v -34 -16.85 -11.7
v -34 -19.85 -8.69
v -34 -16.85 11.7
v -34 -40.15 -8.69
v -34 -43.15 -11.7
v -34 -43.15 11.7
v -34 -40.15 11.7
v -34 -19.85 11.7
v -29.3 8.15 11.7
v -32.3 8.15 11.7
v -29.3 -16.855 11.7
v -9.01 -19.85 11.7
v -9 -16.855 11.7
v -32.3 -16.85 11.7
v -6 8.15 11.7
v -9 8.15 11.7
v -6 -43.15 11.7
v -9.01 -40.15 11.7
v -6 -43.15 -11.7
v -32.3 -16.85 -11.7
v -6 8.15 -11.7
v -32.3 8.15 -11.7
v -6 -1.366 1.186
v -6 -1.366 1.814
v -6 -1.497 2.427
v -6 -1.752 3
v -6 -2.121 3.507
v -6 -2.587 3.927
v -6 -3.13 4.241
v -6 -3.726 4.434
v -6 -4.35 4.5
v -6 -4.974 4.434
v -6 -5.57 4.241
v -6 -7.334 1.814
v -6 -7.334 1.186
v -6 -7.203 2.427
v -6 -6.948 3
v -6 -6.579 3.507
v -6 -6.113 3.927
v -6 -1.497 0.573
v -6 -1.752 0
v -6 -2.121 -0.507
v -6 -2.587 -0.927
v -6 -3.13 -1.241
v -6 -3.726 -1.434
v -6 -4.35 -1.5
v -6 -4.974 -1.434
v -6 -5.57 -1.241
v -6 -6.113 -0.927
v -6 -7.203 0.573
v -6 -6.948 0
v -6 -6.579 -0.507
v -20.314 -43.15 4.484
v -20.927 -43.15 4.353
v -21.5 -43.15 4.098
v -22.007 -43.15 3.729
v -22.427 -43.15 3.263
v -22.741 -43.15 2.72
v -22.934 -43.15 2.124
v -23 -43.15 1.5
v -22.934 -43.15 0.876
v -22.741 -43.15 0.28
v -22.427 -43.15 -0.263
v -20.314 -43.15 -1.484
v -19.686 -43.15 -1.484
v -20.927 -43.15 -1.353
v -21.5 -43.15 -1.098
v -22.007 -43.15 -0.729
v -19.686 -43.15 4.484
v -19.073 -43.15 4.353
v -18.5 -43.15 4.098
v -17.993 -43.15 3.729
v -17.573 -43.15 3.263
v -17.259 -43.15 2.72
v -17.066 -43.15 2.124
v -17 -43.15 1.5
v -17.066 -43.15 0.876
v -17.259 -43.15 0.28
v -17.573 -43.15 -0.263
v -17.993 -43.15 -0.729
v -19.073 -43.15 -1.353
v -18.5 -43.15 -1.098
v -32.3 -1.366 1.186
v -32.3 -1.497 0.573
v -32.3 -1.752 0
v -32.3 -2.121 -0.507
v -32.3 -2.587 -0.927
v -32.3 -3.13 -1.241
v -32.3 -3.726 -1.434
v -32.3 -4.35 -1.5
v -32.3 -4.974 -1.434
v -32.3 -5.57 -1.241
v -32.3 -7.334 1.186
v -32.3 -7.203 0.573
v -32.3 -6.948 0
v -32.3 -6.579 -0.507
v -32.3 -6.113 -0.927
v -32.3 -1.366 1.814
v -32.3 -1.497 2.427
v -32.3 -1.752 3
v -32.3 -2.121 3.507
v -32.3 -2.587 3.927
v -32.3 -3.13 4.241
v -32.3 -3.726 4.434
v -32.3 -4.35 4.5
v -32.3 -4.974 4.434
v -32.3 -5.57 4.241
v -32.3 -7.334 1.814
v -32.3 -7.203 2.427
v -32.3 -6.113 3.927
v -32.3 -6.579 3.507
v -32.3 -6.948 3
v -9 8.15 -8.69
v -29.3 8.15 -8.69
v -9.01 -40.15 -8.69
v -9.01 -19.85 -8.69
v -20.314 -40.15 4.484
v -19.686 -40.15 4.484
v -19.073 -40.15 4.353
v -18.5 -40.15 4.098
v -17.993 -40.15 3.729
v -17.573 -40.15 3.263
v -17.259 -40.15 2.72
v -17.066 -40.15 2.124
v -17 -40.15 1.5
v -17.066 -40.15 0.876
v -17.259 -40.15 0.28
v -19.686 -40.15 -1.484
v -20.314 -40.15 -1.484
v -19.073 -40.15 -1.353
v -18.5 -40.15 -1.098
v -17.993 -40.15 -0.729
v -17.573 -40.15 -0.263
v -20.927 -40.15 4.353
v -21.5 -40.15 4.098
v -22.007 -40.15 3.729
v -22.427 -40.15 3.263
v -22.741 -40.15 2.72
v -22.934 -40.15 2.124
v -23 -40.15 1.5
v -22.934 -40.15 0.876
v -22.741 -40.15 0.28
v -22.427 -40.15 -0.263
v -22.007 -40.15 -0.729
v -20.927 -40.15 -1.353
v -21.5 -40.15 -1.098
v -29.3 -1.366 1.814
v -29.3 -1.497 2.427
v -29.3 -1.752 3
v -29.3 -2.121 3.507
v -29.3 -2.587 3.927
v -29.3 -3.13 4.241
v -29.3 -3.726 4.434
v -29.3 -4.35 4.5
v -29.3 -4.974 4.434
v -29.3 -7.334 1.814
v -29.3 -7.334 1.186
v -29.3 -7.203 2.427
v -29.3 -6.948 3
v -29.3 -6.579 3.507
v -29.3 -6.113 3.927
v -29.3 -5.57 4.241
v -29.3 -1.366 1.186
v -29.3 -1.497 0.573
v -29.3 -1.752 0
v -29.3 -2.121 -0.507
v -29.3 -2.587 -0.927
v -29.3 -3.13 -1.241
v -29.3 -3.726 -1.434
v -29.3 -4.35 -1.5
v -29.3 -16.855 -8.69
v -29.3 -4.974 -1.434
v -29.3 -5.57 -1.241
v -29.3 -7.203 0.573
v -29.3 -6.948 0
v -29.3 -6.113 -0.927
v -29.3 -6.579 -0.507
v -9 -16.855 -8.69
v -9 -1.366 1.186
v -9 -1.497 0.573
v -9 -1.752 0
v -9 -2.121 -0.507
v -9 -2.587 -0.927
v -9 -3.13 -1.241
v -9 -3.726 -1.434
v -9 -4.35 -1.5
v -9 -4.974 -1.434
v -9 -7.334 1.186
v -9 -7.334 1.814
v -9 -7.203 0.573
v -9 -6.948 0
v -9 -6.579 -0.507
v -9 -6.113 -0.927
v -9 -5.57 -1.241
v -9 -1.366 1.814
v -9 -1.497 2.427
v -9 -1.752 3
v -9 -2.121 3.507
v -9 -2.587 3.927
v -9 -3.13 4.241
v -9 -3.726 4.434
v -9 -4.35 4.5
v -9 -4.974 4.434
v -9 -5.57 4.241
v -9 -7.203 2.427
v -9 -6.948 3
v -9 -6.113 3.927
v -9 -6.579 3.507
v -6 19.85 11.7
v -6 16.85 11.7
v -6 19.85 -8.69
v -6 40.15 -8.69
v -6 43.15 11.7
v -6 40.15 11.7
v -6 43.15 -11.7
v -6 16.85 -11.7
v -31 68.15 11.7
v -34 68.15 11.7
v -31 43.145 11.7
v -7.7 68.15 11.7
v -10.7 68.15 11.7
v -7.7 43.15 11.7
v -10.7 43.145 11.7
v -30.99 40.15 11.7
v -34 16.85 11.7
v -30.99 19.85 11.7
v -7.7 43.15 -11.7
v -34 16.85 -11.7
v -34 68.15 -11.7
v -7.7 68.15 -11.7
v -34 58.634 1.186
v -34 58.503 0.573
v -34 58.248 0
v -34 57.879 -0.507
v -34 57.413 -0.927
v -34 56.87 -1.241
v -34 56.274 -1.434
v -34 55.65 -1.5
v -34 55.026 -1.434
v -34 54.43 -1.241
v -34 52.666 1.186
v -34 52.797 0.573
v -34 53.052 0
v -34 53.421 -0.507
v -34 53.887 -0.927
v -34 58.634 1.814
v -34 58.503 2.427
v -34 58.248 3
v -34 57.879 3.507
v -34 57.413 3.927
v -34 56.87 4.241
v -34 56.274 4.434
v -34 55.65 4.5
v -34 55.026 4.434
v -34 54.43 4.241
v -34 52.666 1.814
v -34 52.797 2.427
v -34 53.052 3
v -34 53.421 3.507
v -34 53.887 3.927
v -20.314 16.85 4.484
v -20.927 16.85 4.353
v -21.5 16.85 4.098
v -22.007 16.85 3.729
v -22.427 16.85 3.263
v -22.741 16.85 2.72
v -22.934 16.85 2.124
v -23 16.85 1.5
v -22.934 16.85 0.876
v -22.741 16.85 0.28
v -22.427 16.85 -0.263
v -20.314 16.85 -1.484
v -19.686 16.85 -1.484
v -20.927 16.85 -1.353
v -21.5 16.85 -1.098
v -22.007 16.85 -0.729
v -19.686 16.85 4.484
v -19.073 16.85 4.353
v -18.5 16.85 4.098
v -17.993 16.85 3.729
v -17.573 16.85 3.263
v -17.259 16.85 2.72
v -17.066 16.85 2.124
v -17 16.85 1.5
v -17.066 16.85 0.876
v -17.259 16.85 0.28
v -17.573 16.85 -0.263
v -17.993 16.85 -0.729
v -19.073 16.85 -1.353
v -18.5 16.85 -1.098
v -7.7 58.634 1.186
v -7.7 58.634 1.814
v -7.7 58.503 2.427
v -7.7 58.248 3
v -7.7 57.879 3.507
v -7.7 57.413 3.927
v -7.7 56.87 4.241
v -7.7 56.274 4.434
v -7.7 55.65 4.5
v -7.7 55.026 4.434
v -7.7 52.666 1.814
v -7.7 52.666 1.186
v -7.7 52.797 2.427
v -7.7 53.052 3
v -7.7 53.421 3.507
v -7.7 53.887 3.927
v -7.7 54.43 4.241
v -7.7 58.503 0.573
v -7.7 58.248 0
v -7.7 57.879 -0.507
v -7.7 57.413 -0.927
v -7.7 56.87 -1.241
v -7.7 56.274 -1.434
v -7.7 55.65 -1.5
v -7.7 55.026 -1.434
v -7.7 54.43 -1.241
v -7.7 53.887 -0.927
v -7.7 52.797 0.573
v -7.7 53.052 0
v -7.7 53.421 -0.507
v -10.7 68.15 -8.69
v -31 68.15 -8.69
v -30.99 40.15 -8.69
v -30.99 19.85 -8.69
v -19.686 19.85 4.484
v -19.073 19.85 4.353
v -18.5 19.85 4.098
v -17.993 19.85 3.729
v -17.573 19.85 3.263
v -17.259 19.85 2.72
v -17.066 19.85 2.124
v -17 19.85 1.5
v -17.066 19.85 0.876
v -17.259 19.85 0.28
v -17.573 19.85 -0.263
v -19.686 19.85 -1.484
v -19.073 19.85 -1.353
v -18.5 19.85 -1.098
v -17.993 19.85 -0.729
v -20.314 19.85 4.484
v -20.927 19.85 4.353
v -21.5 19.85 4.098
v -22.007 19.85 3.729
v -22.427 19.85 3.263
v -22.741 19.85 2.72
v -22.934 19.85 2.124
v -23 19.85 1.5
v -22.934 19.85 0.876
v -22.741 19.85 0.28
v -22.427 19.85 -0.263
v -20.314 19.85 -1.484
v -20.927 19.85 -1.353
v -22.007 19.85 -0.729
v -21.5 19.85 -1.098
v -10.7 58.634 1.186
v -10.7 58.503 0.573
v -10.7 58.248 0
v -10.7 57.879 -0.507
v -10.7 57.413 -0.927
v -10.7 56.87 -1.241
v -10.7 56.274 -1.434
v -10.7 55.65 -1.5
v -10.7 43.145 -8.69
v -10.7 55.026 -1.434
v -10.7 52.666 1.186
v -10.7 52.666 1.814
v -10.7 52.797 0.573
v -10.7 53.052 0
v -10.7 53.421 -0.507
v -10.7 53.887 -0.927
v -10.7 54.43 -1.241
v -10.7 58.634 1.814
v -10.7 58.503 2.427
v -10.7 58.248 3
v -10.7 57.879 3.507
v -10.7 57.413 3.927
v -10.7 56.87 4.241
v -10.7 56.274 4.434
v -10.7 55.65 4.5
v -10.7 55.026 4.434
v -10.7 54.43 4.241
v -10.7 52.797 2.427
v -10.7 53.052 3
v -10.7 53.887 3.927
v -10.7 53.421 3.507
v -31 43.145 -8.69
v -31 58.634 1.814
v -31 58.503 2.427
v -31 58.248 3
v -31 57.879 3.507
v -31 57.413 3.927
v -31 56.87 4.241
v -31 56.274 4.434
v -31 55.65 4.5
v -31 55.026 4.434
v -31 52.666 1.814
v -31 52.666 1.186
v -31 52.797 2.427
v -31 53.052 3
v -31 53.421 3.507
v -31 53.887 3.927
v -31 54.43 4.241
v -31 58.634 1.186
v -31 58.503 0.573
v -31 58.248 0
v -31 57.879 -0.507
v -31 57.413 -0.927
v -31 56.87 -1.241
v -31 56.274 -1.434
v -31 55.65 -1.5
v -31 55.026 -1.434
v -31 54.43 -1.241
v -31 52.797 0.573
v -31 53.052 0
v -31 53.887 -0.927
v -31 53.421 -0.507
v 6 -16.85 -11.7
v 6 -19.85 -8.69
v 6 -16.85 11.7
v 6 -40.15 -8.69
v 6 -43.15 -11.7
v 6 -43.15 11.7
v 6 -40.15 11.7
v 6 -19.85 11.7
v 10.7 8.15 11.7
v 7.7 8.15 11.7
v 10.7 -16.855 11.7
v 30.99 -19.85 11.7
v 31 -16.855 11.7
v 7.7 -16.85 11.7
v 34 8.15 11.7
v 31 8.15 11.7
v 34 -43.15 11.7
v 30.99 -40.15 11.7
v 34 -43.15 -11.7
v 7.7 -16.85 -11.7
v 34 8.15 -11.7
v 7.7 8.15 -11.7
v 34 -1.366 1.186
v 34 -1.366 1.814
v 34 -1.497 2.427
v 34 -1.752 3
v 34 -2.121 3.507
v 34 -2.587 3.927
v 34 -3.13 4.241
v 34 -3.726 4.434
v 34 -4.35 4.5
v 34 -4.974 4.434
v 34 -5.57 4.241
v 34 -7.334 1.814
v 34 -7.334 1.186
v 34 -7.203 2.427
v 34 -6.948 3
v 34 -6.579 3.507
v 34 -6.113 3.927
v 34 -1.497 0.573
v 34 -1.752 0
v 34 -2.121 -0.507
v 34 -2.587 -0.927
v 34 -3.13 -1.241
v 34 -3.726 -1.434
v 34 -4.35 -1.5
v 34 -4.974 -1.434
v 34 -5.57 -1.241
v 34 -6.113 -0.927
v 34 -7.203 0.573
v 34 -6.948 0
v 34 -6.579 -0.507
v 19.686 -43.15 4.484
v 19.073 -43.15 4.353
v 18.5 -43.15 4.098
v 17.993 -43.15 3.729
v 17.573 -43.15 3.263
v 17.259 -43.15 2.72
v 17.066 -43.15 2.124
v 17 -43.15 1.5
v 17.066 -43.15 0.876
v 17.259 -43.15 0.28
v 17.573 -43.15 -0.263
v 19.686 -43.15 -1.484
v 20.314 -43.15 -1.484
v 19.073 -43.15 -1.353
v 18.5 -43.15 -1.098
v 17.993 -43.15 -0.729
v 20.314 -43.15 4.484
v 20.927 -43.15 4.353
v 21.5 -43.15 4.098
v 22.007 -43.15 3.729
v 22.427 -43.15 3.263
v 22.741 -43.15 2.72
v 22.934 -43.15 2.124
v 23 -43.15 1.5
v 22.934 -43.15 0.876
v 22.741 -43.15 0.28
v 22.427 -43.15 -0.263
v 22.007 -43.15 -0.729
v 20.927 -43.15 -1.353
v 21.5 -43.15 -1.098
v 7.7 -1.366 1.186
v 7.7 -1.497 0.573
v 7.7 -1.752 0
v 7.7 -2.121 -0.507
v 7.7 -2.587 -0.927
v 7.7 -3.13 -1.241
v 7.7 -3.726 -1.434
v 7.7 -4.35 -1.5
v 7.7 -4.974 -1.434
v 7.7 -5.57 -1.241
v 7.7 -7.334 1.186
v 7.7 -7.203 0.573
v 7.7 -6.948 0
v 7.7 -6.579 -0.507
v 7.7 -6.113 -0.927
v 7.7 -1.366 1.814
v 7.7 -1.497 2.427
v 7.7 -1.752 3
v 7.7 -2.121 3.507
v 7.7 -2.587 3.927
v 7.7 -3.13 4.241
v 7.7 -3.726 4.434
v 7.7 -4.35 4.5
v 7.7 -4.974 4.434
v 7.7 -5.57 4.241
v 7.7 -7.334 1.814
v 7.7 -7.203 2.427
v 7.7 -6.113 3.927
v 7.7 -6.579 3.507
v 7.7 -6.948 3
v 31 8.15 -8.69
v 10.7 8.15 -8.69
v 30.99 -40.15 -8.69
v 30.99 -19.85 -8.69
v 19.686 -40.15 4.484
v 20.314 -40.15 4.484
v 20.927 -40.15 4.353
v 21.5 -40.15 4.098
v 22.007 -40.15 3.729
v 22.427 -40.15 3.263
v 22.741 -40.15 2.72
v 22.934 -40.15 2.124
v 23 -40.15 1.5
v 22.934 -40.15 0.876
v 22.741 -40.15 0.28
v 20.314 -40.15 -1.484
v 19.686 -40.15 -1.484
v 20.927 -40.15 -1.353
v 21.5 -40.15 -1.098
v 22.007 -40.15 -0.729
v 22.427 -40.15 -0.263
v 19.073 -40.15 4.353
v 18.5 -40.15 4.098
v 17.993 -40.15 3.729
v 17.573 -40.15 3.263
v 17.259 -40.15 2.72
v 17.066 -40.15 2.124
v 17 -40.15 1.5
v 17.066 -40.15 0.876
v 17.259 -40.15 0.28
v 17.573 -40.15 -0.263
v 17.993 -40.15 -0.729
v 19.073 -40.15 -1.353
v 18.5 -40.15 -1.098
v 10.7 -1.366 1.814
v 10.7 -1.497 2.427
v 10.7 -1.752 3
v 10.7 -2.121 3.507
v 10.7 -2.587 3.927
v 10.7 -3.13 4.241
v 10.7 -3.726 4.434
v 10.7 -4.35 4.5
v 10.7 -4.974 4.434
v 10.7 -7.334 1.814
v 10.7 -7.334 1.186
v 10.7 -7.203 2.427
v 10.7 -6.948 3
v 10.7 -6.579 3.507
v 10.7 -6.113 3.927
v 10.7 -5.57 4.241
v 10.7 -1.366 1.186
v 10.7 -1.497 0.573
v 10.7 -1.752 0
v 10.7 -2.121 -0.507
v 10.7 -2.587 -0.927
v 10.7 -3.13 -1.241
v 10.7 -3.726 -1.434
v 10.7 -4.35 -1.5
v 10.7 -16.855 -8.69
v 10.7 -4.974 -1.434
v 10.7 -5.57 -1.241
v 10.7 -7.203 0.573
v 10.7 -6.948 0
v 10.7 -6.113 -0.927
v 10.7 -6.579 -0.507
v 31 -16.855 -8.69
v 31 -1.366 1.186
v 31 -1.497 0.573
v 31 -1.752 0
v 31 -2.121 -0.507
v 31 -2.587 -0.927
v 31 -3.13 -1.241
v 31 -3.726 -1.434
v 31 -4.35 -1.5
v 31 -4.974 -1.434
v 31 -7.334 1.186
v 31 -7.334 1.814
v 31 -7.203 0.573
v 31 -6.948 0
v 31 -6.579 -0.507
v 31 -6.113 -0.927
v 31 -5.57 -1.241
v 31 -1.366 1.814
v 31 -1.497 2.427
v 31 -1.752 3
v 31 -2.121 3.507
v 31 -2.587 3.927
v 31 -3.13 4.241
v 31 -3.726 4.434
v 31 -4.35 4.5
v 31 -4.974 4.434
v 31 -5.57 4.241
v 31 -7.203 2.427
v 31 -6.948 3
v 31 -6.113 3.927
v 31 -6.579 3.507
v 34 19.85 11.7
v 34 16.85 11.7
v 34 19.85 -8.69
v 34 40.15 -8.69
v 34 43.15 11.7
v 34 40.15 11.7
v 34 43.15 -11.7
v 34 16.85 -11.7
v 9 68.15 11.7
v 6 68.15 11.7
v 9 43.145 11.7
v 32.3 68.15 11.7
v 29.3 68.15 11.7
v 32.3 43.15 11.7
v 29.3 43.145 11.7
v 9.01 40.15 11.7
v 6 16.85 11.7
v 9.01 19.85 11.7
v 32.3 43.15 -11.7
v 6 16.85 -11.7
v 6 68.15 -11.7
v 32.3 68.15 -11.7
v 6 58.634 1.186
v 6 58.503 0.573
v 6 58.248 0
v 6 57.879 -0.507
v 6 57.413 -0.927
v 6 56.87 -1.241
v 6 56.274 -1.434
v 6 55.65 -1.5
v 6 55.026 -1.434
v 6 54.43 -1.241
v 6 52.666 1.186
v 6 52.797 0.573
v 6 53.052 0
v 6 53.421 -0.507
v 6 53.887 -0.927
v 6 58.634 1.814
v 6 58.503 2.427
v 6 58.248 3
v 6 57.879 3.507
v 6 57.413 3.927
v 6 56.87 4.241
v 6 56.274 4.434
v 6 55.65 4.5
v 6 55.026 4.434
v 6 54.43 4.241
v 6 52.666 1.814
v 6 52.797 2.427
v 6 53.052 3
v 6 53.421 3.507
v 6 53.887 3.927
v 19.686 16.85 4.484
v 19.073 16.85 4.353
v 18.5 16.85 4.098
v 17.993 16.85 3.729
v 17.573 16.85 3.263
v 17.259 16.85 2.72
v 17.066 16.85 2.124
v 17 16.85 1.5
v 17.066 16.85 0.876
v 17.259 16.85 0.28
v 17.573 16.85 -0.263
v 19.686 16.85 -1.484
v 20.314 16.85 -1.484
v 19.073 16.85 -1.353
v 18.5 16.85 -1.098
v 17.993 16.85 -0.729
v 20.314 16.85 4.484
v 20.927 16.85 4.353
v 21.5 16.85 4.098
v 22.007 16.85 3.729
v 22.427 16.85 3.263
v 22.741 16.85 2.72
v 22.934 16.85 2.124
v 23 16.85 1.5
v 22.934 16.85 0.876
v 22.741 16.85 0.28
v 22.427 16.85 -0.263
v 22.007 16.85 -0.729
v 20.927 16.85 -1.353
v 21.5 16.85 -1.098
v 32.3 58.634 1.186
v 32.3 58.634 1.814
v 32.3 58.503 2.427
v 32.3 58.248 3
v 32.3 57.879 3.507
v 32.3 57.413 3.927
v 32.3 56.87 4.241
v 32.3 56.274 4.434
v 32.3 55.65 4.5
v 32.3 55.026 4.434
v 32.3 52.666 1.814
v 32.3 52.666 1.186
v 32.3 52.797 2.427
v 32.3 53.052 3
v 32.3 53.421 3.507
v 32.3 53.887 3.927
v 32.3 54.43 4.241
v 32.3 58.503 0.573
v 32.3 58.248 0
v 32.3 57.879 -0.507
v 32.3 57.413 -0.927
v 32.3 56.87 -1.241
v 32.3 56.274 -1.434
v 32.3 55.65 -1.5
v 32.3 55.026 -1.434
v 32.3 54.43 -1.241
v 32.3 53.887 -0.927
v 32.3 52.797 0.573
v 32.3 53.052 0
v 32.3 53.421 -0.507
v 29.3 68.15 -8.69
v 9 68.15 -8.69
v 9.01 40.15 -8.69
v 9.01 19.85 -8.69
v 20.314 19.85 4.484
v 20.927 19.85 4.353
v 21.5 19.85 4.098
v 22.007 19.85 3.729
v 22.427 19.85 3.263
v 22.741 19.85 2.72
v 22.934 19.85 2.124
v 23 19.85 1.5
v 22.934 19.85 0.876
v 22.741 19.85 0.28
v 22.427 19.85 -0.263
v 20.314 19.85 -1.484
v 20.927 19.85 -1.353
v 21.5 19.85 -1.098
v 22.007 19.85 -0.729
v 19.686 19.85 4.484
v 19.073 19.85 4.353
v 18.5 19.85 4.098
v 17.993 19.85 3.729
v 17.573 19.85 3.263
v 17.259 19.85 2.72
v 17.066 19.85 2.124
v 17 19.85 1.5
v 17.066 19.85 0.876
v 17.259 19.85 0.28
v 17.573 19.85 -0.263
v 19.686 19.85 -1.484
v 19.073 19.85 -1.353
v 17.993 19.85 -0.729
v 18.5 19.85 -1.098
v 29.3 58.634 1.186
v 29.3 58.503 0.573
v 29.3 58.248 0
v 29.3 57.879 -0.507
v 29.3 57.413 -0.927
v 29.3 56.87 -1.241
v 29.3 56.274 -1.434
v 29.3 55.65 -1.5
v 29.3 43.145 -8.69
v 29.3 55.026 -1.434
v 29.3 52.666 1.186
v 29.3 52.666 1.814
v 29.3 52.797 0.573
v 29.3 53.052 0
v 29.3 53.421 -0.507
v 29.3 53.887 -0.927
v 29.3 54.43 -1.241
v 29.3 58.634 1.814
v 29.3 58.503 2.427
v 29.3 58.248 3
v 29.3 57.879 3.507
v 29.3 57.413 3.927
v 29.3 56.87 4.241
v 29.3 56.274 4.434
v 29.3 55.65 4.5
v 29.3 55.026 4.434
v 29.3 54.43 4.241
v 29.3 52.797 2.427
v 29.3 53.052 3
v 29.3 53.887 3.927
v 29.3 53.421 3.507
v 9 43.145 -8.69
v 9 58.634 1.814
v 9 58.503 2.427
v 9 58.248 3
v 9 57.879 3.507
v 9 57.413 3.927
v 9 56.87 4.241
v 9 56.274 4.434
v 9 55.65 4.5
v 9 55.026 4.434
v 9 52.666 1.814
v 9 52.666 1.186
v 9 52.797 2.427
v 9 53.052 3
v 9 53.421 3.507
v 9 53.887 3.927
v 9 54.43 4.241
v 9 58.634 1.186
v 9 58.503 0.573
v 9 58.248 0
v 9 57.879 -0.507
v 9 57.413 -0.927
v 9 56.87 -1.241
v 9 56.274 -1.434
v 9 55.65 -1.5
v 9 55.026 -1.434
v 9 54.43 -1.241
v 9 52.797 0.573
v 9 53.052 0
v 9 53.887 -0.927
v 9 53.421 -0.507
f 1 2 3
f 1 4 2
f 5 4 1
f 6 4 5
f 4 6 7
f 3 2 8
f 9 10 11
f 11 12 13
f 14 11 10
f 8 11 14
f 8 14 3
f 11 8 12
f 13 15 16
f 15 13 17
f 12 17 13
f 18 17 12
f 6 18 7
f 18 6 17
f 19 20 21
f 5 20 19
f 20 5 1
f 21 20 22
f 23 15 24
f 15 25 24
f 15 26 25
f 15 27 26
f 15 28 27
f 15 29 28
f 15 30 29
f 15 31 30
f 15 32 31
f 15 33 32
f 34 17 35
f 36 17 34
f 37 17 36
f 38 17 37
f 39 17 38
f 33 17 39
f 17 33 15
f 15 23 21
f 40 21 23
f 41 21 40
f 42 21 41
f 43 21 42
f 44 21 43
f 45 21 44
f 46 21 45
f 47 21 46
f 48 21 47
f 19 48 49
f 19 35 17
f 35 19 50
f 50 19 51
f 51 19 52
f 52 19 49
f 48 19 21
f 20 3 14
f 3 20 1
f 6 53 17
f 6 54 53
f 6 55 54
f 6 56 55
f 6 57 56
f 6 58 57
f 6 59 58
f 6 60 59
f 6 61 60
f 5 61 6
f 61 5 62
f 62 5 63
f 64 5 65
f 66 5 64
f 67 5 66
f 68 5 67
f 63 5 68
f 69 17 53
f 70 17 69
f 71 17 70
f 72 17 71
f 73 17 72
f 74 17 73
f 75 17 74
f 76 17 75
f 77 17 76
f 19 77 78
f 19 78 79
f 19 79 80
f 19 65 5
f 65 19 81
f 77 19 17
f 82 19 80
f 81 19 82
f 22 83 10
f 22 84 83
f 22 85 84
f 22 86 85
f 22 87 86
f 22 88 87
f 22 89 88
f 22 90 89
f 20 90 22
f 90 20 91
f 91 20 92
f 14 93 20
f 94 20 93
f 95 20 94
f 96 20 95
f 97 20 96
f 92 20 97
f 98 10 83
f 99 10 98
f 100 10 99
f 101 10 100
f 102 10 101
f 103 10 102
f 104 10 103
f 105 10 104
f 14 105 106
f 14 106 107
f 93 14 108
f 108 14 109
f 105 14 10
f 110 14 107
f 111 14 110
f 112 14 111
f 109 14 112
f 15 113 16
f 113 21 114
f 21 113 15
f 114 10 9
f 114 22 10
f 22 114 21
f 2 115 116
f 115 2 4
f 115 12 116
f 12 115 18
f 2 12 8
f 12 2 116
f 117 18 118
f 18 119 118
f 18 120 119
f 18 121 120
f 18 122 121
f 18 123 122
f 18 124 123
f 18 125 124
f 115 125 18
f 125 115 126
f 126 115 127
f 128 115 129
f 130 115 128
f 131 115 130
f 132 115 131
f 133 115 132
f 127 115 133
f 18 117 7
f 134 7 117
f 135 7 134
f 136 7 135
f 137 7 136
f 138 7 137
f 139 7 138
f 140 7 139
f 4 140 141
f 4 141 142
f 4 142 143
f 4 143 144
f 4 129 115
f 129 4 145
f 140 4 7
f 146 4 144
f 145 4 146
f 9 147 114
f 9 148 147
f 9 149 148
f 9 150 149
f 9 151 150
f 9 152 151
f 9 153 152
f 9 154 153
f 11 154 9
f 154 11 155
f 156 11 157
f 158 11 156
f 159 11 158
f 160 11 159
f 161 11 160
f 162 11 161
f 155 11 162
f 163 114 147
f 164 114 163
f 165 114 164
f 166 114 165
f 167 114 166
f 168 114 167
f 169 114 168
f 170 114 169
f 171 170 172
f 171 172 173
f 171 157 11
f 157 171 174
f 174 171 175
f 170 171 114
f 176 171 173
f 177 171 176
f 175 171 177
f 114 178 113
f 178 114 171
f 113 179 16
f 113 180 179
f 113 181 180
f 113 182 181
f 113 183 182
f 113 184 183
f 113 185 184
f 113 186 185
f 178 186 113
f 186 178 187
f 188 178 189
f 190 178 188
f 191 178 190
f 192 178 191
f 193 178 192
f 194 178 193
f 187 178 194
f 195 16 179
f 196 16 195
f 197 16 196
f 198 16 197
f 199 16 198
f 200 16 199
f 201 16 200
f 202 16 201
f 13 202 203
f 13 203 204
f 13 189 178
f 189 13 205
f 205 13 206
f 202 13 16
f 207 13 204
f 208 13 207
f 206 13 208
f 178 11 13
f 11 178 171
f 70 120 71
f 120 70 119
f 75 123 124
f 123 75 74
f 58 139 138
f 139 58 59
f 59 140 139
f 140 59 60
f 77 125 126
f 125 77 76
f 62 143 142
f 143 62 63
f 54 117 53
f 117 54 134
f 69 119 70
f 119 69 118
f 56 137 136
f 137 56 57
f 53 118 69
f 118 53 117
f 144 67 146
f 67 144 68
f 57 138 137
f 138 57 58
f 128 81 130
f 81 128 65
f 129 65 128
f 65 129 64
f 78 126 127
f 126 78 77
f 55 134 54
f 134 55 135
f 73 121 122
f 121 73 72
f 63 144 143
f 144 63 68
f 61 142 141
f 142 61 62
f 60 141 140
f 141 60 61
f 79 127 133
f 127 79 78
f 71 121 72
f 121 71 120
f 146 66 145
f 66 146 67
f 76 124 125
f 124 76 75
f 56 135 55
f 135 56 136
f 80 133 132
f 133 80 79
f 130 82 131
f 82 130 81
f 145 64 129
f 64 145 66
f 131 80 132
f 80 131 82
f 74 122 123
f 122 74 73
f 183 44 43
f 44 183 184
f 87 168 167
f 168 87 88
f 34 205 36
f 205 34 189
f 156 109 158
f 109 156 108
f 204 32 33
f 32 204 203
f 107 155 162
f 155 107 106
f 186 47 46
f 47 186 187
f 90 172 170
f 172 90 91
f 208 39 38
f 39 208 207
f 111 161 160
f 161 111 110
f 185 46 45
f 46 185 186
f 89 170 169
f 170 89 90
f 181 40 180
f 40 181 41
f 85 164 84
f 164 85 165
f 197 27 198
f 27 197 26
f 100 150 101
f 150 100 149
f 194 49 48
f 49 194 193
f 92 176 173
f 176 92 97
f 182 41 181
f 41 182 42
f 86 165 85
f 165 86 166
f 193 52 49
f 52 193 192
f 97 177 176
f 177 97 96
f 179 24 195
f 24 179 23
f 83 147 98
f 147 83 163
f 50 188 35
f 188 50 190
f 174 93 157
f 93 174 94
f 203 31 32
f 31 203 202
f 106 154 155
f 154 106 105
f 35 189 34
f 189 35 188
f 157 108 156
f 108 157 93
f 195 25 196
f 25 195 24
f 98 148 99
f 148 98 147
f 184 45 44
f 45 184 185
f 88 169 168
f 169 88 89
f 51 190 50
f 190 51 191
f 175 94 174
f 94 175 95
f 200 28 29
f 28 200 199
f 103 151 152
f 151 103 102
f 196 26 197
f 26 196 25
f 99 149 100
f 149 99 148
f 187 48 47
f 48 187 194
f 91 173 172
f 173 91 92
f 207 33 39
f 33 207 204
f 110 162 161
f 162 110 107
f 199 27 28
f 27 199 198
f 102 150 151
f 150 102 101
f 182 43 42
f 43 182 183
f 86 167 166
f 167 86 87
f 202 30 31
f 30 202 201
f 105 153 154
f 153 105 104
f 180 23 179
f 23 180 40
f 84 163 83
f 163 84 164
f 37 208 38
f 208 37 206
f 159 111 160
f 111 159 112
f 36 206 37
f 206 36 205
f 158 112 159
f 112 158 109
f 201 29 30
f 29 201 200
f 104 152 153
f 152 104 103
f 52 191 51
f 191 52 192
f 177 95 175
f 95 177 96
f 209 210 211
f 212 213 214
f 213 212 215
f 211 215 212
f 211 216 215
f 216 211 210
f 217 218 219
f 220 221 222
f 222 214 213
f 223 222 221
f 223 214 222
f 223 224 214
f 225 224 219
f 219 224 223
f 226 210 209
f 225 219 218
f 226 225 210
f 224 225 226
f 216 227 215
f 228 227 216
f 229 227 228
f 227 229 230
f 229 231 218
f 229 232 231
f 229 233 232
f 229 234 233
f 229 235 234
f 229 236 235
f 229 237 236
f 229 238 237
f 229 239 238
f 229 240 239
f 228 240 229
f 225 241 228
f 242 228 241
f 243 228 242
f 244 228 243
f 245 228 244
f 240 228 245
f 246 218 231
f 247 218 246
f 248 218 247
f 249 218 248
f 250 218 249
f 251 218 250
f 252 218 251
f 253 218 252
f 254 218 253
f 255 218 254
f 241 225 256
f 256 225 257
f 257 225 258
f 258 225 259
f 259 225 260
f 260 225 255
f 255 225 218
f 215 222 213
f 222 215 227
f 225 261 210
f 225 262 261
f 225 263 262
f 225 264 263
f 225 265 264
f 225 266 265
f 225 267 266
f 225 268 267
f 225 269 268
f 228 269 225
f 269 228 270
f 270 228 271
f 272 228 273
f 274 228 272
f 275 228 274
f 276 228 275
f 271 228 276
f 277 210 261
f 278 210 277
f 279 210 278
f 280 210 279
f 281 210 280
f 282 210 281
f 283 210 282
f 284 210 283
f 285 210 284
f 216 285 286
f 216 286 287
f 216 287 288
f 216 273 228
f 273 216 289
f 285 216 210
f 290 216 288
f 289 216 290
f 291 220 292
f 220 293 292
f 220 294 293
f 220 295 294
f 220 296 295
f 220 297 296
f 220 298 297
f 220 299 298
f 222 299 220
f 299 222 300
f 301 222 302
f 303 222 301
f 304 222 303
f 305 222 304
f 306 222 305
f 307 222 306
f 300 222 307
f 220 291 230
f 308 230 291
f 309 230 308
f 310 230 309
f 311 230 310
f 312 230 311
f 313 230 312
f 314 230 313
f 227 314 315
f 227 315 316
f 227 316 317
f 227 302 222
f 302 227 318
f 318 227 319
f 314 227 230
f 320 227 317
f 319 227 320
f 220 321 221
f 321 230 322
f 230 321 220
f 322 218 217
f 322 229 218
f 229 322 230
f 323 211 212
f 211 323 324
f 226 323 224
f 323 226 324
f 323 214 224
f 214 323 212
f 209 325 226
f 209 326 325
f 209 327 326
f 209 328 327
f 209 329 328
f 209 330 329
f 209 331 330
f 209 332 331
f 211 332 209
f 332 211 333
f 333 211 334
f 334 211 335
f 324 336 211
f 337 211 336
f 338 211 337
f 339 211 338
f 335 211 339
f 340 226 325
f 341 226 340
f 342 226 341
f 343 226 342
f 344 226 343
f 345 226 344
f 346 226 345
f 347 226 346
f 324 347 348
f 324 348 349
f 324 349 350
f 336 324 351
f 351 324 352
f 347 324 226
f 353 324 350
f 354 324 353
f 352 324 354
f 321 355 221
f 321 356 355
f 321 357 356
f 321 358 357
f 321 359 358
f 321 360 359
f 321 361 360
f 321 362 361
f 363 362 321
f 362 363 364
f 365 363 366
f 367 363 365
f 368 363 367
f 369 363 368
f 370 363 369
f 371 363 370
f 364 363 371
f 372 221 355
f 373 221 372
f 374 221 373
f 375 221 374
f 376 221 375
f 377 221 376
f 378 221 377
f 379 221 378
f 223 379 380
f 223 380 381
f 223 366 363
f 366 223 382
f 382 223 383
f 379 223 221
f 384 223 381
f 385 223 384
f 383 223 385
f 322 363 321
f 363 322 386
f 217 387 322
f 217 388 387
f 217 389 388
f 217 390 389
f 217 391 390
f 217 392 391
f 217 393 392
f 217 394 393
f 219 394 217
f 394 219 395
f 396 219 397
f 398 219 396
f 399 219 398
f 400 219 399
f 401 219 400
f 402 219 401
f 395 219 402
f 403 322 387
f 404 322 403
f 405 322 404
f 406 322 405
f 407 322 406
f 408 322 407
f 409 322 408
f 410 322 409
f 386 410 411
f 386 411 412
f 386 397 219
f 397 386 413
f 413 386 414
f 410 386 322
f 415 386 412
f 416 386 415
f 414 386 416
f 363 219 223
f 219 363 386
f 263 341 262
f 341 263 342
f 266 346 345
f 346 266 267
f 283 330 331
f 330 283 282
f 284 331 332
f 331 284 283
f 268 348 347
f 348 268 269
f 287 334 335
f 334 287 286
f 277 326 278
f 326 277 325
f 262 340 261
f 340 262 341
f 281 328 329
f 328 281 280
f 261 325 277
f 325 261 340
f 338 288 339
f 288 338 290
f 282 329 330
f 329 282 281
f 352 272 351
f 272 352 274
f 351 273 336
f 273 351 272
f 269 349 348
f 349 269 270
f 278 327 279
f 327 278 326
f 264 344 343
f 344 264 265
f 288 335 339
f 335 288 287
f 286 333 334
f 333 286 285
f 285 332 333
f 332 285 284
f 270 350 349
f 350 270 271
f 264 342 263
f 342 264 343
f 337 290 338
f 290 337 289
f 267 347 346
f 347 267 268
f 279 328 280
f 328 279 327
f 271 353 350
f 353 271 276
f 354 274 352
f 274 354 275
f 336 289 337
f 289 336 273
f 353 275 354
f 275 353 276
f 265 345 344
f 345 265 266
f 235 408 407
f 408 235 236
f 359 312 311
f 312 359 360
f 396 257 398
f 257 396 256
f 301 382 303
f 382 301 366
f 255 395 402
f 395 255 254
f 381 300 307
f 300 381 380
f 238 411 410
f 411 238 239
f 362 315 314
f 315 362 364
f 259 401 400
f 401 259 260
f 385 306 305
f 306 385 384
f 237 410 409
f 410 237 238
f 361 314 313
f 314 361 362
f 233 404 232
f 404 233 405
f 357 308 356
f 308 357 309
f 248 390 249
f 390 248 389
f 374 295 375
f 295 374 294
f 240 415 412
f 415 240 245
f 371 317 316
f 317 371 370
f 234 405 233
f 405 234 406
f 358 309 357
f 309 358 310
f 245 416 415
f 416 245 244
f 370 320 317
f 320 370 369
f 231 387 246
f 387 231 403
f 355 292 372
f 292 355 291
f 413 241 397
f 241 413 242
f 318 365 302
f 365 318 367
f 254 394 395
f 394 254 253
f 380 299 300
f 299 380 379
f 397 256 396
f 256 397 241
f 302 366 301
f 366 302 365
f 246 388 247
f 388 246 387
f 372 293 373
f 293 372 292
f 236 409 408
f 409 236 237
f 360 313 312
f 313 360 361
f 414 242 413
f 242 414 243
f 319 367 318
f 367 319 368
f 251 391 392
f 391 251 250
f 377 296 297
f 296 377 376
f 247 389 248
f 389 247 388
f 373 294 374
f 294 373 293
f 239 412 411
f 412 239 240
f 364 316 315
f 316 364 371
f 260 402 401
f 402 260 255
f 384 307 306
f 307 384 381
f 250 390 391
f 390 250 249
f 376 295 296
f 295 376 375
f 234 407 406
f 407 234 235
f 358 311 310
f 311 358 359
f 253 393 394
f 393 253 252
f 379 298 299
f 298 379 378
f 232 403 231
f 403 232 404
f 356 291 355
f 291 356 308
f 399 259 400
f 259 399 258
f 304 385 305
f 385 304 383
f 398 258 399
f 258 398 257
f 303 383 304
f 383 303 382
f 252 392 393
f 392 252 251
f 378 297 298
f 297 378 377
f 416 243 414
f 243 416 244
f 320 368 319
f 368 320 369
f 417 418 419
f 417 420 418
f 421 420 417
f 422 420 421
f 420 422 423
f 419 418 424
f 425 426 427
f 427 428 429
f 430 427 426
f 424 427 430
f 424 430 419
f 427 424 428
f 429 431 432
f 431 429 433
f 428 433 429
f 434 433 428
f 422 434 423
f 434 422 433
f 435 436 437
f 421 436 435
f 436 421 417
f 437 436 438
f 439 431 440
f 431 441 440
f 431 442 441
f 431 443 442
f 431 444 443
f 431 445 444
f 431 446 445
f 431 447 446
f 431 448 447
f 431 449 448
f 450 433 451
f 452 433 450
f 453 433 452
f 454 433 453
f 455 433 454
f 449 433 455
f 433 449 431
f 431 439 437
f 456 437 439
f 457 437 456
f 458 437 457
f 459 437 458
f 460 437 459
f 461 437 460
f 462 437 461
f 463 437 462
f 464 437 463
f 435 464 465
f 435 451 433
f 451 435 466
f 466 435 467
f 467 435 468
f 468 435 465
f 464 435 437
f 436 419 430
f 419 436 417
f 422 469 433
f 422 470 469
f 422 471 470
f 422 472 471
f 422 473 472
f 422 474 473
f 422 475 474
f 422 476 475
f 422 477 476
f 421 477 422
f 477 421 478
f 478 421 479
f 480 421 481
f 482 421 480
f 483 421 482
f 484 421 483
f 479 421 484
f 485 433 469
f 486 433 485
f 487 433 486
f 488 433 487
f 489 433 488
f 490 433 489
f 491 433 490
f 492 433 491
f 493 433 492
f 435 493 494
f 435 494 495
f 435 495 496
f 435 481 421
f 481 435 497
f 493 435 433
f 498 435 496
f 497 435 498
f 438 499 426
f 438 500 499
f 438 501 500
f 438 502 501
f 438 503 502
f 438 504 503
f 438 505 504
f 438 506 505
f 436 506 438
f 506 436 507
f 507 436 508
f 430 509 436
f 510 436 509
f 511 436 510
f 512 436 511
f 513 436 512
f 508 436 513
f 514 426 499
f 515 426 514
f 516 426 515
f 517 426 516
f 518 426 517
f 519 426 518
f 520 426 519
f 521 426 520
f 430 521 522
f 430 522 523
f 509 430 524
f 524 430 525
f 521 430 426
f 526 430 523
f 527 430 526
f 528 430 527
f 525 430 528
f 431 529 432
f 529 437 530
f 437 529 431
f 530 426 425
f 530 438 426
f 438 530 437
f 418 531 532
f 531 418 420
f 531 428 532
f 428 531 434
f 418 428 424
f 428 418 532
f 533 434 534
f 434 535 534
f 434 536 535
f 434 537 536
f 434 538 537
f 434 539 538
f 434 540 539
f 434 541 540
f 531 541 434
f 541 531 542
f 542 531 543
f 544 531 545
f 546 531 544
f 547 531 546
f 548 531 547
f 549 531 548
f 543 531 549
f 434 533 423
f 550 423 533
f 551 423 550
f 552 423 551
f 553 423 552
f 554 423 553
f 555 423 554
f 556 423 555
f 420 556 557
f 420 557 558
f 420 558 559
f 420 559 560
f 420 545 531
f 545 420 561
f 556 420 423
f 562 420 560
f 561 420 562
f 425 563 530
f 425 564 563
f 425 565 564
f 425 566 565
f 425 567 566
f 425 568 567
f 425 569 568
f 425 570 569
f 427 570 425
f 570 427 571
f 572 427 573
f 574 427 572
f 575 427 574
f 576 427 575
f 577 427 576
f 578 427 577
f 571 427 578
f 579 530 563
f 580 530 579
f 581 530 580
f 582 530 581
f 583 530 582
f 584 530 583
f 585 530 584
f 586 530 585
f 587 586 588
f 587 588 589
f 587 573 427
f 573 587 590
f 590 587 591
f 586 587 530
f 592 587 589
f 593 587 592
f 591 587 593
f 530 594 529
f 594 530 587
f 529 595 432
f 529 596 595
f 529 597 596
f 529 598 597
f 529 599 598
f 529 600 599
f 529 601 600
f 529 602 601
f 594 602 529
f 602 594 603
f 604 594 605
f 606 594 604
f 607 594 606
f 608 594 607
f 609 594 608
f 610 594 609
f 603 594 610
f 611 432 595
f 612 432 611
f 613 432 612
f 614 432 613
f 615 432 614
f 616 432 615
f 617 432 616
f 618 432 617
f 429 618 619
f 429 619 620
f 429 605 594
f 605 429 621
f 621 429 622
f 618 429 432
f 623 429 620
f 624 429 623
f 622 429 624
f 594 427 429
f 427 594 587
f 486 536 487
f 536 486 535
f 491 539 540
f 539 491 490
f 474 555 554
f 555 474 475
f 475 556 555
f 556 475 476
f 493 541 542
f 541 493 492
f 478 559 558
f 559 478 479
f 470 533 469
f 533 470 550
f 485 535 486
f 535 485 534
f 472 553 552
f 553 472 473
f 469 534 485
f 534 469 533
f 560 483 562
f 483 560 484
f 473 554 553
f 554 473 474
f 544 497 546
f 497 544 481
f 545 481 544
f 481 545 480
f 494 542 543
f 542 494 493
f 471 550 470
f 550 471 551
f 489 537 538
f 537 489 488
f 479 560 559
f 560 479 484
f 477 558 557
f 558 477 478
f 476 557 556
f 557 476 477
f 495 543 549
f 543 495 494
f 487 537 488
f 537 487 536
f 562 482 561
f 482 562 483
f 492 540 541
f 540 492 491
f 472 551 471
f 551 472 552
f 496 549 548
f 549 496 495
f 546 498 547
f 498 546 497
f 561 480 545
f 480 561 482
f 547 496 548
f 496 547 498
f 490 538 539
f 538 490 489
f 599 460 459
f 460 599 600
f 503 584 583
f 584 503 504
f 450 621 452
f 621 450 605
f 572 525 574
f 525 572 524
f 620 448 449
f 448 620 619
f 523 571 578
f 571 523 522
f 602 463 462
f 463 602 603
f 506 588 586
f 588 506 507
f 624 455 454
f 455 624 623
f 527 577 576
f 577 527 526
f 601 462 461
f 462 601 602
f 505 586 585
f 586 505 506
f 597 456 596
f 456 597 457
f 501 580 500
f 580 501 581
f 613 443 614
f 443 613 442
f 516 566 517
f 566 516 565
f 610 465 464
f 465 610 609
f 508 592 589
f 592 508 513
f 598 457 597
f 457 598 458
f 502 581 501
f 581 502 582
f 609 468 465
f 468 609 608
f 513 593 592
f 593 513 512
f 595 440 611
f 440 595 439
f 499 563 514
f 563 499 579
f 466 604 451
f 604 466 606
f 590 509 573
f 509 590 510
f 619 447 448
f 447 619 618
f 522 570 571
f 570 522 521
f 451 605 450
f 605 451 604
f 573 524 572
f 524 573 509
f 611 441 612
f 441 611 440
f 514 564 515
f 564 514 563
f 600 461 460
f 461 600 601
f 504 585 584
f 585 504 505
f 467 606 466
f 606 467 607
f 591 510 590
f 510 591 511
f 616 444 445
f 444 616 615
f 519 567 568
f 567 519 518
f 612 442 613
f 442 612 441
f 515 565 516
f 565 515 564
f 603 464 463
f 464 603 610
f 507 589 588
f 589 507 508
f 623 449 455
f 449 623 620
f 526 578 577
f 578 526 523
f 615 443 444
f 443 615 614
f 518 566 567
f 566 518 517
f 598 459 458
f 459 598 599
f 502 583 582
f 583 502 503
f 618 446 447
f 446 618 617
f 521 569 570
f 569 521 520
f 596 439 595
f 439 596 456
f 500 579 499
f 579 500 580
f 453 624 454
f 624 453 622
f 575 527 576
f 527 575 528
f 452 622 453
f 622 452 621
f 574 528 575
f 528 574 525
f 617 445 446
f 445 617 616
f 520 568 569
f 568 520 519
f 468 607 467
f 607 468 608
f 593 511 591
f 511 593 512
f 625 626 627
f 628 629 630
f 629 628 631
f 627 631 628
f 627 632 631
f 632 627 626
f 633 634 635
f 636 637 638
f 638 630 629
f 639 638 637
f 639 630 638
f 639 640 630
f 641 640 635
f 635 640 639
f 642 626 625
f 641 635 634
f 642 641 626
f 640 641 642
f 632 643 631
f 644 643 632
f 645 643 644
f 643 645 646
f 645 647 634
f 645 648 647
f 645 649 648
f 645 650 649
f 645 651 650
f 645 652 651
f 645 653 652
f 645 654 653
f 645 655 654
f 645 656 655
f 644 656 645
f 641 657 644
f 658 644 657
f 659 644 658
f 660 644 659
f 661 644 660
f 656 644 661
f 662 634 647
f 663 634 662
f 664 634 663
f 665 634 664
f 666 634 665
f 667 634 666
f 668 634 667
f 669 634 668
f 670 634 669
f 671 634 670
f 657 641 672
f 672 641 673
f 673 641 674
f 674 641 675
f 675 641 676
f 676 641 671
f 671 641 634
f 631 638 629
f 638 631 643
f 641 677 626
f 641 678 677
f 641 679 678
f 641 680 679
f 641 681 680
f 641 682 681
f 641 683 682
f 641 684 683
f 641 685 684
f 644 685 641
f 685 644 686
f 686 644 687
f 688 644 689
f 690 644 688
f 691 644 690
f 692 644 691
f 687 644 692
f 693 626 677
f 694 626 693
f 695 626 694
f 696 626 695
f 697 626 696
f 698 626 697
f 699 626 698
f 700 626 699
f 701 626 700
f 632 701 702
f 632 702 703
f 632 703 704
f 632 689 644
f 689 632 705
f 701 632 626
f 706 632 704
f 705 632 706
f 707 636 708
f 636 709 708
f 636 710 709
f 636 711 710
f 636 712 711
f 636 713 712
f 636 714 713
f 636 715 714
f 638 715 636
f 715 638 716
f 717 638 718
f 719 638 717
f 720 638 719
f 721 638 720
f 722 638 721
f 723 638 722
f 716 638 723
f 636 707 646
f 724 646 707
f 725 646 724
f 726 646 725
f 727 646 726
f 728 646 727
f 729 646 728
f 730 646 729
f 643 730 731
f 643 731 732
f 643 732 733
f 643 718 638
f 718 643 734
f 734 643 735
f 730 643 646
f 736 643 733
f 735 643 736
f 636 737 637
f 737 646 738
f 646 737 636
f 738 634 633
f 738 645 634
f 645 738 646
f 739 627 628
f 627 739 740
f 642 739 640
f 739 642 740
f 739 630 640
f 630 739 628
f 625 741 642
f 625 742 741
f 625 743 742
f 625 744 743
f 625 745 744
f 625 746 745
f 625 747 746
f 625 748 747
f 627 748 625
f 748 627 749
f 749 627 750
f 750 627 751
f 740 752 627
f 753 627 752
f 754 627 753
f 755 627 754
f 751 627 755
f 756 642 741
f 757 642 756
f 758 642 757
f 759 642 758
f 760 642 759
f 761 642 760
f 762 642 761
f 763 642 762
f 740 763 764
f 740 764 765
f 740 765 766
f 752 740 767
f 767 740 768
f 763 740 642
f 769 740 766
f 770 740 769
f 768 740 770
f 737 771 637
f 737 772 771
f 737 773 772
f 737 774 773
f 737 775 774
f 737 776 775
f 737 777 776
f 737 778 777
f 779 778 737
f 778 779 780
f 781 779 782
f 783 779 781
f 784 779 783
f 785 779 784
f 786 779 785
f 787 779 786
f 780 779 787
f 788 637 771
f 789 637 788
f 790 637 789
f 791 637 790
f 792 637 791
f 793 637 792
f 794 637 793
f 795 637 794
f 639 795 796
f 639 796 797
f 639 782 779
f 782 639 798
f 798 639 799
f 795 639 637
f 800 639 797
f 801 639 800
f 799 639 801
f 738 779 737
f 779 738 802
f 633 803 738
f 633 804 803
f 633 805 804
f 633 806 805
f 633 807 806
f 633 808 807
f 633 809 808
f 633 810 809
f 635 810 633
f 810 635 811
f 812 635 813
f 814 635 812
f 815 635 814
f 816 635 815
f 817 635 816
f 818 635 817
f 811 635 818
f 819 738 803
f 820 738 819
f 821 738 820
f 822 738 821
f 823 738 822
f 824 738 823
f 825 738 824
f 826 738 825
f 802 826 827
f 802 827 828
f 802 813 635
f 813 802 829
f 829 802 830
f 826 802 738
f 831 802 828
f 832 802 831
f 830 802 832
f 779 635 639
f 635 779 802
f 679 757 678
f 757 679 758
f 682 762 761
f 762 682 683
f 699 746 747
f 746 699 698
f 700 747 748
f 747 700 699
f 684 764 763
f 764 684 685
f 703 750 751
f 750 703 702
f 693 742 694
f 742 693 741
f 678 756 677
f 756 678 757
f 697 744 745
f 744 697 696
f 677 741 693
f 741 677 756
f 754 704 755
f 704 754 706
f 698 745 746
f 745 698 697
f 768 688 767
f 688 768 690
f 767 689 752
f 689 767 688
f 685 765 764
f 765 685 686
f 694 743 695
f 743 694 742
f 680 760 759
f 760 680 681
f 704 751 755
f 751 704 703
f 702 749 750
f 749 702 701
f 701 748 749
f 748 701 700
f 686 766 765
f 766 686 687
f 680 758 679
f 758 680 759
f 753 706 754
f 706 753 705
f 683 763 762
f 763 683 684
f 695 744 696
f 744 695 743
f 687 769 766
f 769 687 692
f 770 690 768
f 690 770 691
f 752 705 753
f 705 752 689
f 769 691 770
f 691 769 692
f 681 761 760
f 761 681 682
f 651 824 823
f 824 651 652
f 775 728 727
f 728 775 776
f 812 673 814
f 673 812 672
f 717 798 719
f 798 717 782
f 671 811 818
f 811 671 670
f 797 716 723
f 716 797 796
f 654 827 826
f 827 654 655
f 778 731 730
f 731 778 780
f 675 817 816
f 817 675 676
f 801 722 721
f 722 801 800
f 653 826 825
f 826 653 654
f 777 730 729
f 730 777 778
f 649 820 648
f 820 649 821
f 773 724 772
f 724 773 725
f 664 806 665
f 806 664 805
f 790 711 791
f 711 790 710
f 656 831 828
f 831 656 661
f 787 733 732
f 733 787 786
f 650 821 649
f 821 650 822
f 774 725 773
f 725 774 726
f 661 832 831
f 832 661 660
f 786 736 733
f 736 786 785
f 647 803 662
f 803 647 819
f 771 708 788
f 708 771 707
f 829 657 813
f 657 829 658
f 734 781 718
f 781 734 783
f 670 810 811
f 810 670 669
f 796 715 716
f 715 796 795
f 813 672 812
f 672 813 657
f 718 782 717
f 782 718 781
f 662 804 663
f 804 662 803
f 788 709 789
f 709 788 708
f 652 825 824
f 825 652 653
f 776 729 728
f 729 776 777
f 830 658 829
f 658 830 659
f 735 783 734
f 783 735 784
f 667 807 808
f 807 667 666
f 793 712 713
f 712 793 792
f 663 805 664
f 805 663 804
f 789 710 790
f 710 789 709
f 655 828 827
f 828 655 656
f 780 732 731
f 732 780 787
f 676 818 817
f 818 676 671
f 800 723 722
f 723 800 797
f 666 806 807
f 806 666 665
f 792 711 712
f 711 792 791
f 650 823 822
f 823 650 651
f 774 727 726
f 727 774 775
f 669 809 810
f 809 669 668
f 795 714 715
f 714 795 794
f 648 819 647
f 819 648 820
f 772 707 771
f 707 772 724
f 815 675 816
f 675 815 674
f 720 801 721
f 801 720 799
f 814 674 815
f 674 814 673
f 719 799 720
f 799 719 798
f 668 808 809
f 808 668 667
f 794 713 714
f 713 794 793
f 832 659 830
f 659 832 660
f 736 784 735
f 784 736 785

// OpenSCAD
$fn = 30;

m5rad = 3;
dimh = 20.3;
dimv = 20.4;

sidelen = 25;
frontlen = 25;
wall = 3;

for (i=[-1, 1], j=[-1, 1])
	translate([i*20, j*30, 0])
		if (j == 1)
			corner();
		else
			mirror() corner();


module corner() {
	difference() {
		union() {
			cube([frontlen+wall, dimh+wall*2, dimv+wall], true);
			translate([(dimh+wall*2)/2-(frontlen+wall)/2, (sidelen)/2+dimh/2+wall, 0])
				cube([dimh+wall*2, sidelen, dimv+wall], true);
		}
		translate([wall/2+0.01, 0, wall/2+0.01])
			cube([frontlen, dimh, dimv], true);
		translate([(dimh+wall*2)/2-(frontlen+wall)/2, (sidelen)/2+dimh/2+wall, wall/2+0.01])
				cube([dimh, sidelen+0.01, dimv], true);
		translate([0, 0, wall/2])
			rotate([90, 0, 0])
				cylinder(r=m5rad, h=dimh);
	
		translate([0, (sidelen)/2+dimh/2+wall, wall/2])
			rotate([0, 90, 0])
				cylinder(r=m5rad, h=2*dimh, center=true);
	}
}
